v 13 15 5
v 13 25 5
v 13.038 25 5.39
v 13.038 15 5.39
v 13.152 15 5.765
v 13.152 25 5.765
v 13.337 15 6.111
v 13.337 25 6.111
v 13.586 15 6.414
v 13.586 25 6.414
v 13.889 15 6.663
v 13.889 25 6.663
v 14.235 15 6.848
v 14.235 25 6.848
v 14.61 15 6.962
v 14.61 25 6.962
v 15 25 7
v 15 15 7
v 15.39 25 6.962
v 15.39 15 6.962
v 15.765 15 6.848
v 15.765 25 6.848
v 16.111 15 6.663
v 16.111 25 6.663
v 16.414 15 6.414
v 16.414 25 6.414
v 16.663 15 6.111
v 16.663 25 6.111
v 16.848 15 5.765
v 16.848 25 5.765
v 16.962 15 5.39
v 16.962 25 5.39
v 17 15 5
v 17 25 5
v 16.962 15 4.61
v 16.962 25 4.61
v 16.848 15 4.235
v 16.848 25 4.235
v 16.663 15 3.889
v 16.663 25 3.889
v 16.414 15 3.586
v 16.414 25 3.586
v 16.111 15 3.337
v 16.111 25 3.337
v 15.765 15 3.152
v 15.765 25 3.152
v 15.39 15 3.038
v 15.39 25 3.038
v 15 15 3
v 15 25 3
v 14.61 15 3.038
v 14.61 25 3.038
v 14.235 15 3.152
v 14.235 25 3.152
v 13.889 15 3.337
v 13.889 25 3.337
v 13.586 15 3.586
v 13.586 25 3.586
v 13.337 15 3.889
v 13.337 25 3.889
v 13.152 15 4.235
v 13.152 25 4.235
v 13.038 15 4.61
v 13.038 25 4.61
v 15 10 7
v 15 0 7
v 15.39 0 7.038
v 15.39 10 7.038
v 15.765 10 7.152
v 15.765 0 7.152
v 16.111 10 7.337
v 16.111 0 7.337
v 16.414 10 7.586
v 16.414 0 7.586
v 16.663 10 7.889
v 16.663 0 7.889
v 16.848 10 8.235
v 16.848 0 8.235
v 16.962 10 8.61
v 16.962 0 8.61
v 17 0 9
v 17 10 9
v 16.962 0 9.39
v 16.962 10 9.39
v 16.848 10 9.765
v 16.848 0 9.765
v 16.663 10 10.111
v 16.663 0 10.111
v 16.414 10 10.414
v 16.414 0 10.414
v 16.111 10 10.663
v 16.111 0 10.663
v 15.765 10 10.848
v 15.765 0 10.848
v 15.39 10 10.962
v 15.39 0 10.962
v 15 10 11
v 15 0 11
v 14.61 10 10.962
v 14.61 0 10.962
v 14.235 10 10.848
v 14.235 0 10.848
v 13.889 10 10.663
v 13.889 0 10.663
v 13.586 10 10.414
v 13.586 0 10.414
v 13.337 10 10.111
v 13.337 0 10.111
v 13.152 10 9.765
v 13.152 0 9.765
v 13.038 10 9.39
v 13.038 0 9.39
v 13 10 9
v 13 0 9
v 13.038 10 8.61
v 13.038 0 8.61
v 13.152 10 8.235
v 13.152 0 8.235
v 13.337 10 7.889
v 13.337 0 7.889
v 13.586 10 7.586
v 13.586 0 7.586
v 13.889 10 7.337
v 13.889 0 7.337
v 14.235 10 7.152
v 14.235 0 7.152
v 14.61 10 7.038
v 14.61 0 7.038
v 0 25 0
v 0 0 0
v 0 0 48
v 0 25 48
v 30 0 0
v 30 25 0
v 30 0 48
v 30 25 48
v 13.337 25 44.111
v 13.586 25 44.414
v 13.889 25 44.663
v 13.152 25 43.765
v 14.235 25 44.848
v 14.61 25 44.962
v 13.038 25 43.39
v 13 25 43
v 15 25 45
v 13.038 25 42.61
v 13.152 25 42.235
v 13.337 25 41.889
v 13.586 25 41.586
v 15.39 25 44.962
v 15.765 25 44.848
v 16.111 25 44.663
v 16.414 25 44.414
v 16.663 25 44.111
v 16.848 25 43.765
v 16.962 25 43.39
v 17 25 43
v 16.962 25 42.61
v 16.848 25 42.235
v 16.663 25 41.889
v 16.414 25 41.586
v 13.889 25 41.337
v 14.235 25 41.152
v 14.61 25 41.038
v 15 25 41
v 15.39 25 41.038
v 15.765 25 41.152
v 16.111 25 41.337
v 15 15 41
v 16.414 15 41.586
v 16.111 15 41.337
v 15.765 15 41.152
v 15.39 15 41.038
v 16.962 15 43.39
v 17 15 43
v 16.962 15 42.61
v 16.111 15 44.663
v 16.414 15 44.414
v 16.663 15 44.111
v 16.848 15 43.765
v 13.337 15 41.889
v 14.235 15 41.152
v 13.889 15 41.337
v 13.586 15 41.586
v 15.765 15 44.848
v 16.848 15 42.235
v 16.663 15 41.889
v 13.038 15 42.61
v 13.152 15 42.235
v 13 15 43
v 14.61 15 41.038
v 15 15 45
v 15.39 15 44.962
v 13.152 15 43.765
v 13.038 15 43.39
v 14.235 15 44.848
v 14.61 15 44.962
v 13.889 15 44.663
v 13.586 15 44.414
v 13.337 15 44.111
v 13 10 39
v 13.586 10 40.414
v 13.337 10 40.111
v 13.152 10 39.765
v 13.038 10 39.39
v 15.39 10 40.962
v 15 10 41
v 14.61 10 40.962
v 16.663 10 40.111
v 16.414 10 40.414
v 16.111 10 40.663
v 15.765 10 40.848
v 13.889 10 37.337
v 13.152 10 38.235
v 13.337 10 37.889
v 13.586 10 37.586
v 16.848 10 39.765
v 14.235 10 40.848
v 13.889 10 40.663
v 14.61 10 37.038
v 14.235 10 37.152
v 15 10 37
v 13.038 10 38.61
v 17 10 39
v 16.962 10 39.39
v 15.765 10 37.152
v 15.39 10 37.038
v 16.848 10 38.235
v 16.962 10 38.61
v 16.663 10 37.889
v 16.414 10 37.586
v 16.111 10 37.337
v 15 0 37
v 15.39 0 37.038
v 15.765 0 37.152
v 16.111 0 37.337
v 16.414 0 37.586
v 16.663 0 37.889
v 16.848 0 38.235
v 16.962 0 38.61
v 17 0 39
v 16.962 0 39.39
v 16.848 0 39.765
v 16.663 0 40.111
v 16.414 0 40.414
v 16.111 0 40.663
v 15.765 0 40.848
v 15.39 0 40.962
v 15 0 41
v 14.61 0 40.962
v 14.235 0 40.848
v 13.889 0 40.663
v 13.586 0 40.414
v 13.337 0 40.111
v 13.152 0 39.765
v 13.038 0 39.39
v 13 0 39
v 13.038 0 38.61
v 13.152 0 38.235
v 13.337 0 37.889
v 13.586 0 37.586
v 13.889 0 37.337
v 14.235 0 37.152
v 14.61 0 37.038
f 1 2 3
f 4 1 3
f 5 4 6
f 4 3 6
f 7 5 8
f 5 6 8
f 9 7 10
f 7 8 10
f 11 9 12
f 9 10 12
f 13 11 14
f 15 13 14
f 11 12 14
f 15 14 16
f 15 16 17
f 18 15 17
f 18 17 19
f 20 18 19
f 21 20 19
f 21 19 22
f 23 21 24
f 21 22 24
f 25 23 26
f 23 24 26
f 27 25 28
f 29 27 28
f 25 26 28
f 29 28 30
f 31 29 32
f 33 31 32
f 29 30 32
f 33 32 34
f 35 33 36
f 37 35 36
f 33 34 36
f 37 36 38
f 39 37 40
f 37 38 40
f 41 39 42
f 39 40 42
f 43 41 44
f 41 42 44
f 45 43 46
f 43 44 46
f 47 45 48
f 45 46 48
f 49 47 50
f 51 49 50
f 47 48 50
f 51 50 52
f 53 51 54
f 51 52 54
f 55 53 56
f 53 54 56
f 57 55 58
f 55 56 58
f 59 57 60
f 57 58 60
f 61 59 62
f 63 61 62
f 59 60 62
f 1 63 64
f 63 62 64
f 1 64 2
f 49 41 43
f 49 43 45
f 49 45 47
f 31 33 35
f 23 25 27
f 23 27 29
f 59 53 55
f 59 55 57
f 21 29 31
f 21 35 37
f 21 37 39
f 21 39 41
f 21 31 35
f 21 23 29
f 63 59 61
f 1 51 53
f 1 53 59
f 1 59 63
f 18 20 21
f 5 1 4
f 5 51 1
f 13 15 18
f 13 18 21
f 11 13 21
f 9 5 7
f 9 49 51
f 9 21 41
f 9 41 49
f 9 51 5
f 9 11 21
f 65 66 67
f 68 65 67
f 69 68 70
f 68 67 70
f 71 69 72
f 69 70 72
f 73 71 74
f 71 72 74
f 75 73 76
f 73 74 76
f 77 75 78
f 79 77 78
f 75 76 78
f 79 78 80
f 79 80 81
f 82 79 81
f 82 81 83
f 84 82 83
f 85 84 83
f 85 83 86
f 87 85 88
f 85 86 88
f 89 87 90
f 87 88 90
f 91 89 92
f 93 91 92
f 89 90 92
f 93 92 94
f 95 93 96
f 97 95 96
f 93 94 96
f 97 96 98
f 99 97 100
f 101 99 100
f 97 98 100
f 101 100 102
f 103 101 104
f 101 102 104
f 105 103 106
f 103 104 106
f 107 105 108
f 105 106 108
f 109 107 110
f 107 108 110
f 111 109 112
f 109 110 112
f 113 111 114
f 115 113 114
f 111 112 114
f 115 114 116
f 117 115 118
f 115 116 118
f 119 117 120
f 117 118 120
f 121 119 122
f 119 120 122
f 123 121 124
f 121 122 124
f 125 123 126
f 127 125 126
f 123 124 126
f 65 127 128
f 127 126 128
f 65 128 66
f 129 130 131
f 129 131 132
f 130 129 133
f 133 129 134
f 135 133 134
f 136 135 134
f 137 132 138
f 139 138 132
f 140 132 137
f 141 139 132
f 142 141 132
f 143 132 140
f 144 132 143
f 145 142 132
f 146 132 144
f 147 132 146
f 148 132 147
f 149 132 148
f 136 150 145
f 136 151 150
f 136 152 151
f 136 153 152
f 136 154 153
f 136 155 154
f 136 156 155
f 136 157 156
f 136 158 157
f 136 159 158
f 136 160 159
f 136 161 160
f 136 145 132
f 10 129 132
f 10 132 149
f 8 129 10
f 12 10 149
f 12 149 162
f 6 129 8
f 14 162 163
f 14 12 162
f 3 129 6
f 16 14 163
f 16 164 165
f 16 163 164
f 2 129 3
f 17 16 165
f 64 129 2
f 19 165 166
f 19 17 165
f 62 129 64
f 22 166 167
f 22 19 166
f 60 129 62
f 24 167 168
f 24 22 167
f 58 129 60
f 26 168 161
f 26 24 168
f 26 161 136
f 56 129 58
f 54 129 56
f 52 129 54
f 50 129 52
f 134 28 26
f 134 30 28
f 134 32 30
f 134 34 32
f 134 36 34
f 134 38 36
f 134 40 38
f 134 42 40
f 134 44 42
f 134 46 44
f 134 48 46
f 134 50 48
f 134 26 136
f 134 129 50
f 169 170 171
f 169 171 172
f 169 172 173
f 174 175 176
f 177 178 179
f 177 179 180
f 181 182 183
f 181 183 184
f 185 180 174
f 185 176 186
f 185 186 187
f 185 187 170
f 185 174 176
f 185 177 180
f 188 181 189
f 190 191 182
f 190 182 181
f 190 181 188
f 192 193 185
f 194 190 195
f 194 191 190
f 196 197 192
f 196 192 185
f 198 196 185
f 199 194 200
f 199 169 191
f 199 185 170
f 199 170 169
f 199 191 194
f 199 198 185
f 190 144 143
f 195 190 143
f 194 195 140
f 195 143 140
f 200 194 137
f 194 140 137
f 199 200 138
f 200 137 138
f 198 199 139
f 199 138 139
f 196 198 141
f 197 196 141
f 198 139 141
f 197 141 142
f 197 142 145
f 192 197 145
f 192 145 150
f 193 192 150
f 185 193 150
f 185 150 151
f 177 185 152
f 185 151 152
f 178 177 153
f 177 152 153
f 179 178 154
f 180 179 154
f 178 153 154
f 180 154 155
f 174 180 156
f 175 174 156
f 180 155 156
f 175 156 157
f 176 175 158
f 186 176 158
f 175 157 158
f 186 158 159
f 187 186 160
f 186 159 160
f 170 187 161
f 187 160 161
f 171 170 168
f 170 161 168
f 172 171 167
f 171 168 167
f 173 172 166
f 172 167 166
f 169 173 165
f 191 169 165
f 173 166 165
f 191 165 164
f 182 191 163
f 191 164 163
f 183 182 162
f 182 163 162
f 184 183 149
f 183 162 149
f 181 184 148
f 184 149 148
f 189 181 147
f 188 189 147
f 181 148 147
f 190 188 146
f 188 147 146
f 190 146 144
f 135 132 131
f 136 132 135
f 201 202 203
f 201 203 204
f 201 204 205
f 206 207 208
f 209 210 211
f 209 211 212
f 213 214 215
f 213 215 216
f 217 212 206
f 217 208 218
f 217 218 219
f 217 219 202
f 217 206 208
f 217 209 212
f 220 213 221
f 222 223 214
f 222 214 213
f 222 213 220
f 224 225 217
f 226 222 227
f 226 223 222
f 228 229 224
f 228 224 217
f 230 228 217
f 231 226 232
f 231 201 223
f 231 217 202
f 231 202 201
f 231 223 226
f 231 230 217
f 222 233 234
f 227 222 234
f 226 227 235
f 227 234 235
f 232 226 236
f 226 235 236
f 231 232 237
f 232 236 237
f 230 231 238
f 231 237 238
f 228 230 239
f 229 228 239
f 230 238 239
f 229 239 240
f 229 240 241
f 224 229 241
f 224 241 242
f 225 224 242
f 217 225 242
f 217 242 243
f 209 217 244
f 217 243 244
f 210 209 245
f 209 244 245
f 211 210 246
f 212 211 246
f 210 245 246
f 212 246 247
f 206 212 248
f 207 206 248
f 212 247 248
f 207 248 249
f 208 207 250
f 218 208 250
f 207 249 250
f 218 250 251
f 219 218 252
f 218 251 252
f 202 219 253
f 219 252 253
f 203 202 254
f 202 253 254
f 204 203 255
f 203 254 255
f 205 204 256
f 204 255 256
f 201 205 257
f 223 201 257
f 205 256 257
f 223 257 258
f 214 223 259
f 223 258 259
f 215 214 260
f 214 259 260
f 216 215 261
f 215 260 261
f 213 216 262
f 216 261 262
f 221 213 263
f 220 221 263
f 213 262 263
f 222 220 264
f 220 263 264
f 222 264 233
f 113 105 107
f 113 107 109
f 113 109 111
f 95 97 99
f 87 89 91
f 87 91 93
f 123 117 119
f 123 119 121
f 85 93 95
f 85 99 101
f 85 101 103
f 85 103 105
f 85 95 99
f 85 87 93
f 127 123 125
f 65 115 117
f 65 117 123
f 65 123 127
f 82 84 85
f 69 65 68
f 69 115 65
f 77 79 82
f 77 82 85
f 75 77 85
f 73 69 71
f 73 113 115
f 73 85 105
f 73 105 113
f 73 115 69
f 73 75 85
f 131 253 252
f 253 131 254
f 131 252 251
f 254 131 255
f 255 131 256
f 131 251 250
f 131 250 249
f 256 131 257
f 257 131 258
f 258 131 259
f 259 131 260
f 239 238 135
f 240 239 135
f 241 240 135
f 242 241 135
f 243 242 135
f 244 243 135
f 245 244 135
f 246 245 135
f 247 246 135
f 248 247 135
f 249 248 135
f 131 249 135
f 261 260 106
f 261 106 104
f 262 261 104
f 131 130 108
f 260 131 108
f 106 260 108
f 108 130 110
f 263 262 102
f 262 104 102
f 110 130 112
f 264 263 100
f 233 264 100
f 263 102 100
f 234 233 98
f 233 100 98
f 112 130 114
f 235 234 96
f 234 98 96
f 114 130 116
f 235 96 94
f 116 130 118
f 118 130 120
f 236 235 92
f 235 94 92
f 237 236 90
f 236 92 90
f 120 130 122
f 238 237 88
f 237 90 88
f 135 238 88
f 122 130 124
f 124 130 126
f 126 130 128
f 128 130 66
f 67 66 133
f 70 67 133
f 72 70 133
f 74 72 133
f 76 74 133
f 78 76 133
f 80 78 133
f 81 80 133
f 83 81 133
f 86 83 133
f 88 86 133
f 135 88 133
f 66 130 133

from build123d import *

# Parameters (mm, degrees)
SKETCH1_W           = 30
SKETCH1_H           = 25
BOSS_EXTRUDE1_DEPTH = 48
SKETCH2_R           = 2
CUT_EXTRUDE3_DEPTH  = 10
SKETCH3_R           = 2
CUT_EXTRUDE4_DEPTH  = 10


with BuildPart() as part:
    # Sketch1 → Boss-Extrude1 (new body)
    with BuildSketch(Plane.XY):
        with Locations((15, 12.5)):
            Rectangle(SKETCH1_W, SKETCH1_H)
    extrude(amount=BOSS_EXTRUDE1_DEPTH)

    # Sketch2 → Cut-Extrude3 (cut)
    with BuildSketch(Plane(origin=(0, 25, 0), x_dir=(1, 0, 0), z_dir=(0, 1, 0))):
        with Locations(Location((15, -5, 0), (0, 0, 180))):
            Circle(SKETCH2_R)
        with Locations(Location((15, -43, 0), (0, 0, 180))):
            Circle(SKETCH2_R)
    extrude(amount=-CUT_EXTRUDE3_DEPTH, mode=Mode.SUBTRACT)

    # Sketch3 → Cut-Extrude4 (cut)
    with BuildSketch(Plane.XZ):
        with Locations(Location((15, 39, 0), (0, 0, 270))):
            Circle(SKETCH3_R)
        with Locations(Location((15, 9, 0), (0, 0, 270))):
            Circle(SKETCH3_R)
    extrude(amount=-CUT_EXTRUDE4_DEPTH, mode=Mode.SUBTRACT)


solid = part.part
